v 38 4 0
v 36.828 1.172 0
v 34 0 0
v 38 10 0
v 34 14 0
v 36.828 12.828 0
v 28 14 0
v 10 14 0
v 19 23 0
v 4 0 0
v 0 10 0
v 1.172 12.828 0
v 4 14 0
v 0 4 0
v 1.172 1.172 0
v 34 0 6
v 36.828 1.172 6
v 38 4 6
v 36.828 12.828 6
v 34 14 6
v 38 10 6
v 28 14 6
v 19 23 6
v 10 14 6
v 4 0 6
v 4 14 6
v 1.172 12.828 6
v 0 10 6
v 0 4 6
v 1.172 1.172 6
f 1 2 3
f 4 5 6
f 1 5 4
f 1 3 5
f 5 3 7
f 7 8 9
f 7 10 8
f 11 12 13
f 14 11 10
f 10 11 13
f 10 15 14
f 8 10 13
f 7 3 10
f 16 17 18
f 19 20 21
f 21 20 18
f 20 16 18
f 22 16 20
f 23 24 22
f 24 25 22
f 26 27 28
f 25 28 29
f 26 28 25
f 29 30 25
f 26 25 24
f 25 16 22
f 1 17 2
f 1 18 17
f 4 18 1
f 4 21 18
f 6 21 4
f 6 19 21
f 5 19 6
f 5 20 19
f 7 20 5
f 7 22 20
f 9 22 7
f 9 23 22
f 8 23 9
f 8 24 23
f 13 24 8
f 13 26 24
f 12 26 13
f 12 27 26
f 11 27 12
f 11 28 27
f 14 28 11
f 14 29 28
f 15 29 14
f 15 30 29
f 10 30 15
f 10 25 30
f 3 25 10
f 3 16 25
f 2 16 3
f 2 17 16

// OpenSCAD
$fn = 32;

// ----------------------------------------------------------------------
// Ratchet pawl: 38 x 14 mm body, beak 9 mm сверху
// ----------------------------------------------------------------------

// --- parameters (mm) ---
profile_height = 6;       // extrusion height
profile_points = 15;      // points of the closed outline

profile = [[0, 4], [1.172, 1.172], [4, 0], [34, 0], [36.828, 1.172], [38, 4], [38, 10], [36.828, 12.828], [34, 14], [28, 14], [19, 23], [10, 14], [4, 14], [1.172, 12.828], [0, 10]];  // single closed polygon, 15 points, counter clockwise

// --- the one profile operation ---
linear_extrude(height = profile_height) polygon(points = profile);
